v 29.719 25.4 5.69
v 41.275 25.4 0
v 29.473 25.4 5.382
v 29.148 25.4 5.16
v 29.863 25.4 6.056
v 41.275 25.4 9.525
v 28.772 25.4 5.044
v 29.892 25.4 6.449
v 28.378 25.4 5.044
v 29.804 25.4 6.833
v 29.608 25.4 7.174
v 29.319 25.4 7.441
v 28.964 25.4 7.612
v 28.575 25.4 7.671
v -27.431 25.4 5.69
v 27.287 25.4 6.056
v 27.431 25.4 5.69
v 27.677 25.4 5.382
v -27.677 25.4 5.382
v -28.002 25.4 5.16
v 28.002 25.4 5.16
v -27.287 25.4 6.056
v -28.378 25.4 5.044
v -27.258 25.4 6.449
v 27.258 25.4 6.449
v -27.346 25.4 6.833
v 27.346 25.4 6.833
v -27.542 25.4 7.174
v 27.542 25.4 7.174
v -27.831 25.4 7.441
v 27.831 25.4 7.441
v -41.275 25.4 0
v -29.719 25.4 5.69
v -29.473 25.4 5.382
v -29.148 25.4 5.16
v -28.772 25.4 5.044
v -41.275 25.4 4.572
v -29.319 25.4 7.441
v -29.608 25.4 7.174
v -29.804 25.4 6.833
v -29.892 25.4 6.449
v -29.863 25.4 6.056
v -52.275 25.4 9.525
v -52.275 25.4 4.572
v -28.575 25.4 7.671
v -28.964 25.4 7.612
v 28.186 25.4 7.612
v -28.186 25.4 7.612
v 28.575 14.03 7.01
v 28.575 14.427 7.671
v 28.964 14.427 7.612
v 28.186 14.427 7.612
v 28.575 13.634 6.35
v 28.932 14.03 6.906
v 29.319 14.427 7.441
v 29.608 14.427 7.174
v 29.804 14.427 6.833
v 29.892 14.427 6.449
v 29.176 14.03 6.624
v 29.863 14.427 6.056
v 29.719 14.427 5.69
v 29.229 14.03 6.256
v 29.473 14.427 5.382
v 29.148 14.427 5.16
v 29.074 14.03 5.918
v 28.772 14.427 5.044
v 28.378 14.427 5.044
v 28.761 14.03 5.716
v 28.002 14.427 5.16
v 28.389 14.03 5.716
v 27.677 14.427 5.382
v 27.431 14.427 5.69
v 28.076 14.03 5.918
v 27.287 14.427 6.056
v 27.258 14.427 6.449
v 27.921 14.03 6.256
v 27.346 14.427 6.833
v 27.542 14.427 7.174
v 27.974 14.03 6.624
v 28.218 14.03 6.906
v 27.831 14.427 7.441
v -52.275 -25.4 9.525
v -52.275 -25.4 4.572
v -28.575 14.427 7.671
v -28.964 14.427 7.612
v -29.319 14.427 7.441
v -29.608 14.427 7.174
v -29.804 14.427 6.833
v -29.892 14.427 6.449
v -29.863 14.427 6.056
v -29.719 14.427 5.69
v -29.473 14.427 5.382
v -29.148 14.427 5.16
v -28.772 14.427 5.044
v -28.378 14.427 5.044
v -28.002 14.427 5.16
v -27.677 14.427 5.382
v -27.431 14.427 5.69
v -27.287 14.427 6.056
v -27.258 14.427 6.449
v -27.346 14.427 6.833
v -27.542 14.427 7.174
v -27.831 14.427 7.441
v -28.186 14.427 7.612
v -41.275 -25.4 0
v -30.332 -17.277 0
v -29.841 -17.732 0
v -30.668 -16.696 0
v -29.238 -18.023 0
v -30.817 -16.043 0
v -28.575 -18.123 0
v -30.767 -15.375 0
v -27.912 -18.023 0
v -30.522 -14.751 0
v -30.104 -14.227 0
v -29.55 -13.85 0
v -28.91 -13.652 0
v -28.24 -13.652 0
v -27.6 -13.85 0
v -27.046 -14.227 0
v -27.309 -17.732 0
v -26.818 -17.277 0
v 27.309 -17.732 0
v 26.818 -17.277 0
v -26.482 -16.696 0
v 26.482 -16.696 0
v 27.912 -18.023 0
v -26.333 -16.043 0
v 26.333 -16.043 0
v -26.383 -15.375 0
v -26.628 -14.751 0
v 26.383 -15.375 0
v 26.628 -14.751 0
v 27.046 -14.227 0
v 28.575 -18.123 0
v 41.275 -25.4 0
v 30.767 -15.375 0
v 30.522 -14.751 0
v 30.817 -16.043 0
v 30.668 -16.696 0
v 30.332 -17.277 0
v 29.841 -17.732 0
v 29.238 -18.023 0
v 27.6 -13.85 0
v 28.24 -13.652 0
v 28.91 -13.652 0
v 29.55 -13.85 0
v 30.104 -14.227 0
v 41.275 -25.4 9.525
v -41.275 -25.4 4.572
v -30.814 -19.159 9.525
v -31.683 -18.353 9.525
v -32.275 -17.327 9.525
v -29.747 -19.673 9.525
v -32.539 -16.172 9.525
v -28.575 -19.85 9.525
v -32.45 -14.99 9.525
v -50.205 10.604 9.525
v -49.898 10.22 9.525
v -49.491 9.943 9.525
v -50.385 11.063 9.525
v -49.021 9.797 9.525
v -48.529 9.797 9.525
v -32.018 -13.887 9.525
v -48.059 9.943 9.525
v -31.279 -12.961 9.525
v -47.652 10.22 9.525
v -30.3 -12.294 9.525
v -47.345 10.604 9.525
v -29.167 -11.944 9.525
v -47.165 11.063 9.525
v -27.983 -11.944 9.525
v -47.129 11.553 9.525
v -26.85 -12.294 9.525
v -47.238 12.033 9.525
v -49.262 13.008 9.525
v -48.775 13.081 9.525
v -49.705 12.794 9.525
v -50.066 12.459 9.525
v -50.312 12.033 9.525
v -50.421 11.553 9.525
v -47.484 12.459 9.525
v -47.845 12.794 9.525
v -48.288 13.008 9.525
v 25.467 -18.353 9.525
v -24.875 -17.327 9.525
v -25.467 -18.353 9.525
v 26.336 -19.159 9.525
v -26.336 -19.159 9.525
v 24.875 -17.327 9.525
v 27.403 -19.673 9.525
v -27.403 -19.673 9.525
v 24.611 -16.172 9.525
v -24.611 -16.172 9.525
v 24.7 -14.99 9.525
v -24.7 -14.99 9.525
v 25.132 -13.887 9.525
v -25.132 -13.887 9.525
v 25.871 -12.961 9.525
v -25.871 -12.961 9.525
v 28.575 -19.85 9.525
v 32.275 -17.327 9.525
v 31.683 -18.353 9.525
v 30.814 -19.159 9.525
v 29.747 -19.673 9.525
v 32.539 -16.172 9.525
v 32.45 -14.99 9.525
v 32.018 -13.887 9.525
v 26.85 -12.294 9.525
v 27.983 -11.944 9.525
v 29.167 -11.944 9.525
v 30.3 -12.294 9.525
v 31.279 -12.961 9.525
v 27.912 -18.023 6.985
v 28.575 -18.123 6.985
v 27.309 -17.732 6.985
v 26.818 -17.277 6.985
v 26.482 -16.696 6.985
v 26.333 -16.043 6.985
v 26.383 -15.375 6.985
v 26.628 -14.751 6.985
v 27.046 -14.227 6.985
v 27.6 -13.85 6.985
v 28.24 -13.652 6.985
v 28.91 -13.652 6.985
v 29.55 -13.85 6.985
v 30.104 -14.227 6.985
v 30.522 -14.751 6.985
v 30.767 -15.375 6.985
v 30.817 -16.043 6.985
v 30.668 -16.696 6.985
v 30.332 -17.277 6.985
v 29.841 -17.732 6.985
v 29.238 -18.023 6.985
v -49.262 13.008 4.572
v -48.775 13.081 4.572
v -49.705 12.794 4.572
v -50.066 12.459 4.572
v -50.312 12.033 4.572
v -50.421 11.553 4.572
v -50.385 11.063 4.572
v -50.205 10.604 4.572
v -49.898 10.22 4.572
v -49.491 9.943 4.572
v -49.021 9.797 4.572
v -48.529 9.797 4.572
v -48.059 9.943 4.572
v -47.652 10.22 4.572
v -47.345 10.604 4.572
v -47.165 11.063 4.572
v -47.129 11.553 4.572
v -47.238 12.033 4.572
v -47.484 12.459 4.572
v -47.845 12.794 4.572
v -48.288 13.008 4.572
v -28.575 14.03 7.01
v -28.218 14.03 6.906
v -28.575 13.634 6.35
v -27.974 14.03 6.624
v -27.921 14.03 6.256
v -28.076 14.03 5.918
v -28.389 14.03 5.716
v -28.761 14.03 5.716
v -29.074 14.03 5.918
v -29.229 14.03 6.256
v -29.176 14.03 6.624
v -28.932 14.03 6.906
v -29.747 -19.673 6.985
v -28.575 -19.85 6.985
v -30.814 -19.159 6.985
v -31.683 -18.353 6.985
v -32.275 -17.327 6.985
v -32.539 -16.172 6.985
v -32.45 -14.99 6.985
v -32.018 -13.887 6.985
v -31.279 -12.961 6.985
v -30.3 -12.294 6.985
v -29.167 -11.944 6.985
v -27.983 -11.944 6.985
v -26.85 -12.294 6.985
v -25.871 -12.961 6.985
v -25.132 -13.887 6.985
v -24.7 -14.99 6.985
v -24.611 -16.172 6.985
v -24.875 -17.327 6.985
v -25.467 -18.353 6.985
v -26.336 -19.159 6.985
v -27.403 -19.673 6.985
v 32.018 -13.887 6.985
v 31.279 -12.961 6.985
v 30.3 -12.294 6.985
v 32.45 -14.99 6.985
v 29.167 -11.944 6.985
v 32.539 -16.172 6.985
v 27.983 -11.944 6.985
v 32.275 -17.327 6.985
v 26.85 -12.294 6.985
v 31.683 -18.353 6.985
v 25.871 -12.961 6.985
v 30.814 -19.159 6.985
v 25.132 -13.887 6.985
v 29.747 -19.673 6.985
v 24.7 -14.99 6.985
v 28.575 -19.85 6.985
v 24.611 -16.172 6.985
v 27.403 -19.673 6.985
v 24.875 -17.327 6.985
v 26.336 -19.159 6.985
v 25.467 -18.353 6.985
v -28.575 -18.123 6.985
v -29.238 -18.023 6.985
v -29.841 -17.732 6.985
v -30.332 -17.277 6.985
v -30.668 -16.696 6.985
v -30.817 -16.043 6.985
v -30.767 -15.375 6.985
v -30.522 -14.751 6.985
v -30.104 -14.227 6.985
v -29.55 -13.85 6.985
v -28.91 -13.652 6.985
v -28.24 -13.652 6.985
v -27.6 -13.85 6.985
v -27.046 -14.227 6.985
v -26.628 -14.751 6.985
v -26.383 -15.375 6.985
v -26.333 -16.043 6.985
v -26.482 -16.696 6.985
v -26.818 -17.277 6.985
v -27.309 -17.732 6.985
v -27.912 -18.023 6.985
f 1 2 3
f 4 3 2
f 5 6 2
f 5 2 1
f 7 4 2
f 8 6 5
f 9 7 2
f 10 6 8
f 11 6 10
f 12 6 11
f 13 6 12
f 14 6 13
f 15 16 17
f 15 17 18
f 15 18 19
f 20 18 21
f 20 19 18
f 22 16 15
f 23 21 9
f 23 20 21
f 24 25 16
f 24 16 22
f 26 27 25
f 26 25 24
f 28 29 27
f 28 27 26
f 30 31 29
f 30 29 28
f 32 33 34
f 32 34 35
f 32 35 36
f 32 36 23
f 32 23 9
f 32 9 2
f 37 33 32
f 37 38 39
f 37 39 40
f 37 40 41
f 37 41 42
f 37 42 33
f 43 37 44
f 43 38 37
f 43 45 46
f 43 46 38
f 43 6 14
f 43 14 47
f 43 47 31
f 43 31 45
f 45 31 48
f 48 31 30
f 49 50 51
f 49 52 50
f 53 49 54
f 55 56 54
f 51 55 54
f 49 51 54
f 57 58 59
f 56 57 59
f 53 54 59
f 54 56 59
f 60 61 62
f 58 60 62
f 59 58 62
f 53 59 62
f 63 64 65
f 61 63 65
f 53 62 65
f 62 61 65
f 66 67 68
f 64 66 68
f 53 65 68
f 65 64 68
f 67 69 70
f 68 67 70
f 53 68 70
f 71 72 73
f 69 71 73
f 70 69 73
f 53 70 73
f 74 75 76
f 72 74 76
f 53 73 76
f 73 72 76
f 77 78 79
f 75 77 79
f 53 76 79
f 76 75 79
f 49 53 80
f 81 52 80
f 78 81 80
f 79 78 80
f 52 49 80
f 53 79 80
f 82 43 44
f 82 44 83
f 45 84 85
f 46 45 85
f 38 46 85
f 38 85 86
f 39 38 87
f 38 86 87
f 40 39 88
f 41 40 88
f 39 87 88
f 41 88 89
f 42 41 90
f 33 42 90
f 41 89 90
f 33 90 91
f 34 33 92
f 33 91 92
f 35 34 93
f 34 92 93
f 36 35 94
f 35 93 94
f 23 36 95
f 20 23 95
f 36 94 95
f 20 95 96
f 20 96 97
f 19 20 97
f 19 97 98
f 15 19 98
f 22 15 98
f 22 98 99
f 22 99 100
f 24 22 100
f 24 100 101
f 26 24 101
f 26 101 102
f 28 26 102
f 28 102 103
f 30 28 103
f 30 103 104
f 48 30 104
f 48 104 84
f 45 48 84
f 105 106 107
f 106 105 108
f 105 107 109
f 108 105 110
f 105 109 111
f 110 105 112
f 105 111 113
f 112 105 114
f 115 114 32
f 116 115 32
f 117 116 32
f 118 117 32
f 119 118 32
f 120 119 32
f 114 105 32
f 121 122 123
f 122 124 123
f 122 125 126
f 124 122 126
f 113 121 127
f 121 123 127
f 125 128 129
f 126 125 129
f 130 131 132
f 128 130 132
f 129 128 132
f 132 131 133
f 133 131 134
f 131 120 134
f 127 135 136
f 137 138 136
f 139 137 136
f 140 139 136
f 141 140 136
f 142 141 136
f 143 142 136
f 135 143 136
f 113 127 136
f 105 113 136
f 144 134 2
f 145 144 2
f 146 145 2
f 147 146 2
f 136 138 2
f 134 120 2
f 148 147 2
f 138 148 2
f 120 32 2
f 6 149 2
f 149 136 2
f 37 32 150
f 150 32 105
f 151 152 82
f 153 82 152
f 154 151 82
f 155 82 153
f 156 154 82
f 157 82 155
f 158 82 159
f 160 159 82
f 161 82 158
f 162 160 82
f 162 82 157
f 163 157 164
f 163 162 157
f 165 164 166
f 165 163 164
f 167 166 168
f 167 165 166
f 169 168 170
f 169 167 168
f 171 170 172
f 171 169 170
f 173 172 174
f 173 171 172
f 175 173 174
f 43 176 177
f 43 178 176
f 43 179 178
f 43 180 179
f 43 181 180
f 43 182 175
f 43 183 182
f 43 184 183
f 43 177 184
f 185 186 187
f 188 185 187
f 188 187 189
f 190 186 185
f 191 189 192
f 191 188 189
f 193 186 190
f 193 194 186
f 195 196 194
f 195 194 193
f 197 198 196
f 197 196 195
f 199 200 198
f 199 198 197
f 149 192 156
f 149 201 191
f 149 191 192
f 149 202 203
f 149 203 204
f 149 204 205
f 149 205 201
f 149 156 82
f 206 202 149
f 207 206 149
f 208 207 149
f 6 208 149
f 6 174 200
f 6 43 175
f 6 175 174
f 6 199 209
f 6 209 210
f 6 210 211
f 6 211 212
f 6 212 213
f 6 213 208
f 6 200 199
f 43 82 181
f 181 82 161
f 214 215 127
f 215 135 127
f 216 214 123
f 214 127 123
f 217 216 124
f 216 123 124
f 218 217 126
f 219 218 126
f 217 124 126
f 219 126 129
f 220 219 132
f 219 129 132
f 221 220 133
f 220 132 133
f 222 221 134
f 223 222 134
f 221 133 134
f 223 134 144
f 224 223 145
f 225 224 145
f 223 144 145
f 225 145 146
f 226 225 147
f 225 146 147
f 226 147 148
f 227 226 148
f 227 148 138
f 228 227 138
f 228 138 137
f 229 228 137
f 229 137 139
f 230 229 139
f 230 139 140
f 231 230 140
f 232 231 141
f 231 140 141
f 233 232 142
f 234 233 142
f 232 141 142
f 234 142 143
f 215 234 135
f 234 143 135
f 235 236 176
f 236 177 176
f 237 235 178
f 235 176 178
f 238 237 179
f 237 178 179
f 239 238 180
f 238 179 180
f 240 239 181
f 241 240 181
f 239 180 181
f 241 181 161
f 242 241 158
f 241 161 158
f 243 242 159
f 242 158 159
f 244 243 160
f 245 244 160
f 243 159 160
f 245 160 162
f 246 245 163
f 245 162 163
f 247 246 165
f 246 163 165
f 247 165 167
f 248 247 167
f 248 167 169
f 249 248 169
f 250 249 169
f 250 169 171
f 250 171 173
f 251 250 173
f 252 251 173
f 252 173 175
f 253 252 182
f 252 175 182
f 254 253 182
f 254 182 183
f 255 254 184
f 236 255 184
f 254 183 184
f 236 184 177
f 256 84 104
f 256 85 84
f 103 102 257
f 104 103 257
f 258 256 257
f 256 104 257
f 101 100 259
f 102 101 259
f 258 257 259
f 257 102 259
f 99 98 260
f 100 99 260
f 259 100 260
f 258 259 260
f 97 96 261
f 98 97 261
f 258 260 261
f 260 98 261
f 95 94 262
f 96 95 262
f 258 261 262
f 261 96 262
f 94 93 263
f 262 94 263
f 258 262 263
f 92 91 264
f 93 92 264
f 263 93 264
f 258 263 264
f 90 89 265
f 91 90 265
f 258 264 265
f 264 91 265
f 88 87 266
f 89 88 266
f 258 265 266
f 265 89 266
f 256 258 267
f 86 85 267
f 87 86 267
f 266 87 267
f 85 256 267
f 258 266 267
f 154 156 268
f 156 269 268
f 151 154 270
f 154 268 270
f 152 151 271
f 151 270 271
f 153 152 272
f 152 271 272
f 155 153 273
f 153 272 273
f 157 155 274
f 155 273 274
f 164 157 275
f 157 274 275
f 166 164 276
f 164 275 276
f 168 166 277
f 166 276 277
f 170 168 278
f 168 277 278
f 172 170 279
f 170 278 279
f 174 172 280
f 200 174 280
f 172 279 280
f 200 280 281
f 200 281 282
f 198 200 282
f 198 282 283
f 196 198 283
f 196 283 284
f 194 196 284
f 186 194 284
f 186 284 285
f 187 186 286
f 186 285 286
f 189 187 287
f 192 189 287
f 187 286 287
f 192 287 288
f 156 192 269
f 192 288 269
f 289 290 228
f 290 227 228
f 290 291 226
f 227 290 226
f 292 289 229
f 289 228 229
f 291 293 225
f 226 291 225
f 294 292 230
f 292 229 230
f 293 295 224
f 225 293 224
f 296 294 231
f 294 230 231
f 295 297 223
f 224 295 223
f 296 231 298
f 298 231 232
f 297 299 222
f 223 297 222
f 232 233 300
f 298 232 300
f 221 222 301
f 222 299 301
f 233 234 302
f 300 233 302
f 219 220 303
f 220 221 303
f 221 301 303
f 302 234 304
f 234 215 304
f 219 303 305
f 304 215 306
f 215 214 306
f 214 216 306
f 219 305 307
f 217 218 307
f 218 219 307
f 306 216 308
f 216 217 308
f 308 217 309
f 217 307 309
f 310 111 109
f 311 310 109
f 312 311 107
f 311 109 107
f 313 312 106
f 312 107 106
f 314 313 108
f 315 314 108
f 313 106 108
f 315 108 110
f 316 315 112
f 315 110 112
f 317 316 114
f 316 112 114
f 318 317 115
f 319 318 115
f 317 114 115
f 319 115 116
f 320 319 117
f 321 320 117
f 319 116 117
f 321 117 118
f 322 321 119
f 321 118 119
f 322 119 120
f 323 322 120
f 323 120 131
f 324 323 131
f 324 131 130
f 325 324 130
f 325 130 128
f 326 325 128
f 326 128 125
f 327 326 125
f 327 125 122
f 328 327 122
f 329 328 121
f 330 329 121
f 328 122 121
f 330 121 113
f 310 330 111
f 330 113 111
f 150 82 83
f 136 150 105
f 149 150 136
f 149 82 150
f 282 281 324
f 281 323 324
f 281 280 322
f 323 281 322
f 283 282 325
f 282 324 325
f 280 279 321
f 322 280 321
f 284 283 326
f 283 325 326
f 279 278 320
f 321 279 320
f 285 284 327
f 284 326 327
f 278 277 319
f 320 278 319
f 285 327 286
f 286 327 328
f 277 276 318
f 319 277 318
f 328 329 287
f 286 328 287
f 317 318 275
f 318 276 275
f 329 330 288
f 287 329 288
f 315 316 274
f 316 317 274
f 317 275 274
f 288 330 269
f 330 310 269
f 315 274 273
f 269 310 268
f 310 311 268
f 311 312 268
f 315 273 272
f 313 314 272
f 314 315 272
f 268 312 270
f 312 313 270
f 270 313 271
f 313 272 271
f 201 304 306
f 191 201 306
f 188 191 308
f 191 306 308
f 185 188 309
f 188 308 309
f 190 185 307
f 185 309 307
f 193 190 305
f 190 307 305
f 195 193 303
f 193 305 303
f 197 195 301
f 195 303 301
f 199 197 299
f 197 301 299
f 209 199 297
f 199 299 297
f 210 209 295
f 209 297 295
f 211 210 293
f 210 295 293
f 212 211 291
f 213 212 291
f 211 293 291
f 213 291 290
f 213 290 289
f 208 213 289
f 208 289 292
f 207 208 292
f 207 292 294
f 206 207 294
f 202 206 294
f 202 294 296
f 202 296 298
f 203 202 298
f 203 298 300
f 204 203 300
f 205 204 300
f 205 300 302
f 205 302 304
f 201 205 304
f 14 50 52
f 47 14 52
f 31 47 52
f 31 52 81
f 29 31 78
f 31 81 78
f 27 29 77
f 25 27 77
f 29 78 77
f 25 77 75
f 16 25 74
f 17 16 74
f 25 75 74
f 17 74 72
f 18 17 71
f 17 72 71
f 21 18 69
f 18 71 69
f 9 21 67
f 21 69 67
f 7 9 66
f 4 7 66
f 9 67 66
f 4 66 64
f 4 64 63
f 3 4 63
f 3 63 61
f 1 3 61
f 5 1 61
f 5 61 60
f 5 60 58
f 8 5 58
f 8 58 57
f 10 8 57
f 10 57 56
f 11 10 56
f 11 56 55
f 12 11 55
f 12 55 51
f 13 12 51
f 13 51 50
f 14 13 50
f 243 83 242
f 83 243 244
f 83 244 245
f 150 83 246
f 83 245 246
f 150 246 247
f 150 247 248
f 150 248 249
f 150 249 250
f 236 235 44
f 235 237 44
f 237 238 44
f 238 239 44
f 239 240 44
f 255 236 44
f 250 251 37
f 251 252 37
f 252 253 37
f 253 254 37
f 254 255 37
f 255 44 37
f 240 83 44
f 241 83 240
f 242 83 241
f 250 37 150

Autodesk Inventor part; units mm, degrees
ref_plane "YZ Plane" through (0, 0, 0) normal (1, 0, 0) x (0, 1, 0)
ref_plane "XZ Plane" through (0, 0, 0) normal (0, 1, 0) x (-1, 0, 0)
ref_plane "XY Plane" through (0, 0, 0) normal (0, 0, 1) x (1, 0, 0)
sketch "Sketch1" plane through (0, 0, 0) normal (0, 0, 1) x (1, 0, 0)
  line L0 (-41.275, -25.4) -> (41.275, -25.4)
  line L1 (41.275, -25.4) -> (41.275, 25.4)
  line L2 (41.275, 25.4) -> (-41.275, 25.4)
  line L3 (-41.275, 25.4) -> (-41.275, -25.4)
  line L4 (-41.275, -25.4) -> (41.275, 25.4) construction
  line L5 (41.275, -25.4) -> (-41.275, 25.4) construction
  point P0 (0, 0)
  dimension "d0" = 82.55
  dimension "d1" = 50.8
extrude "Extrusion1" add sketch "Sketch1" along normal blind 9.525
sketch "Sketch2" plane through (0, 0, 9.525) normal (0, 0, 1) x (1, 0, 0)
  line L0 (-28.575, -15.875) -> (28.575, -15.875)
  line L1 (-41.275, 25.4) -> (-41.275, -25.4) projected
  line L2 (-41.275, -25.4) -> (41.275, -25.4) projected
  point P0 (0, 0)
  dimension "d4" = 57.15
  dimension "d5" = 12.7
  dimension "d6" = 9.525
hole "Hole1" at (-28.575, -15.875, 9.525) at (28.575, -15.875, 9.525) direction (0, 0, -1) diameter 4.4958 depth 25.4 tip angle 118 counterbore diameter 7.9502 counterbore depth 2.54 clearance for "Socket Head Cap Screw" size "#8" standard "Ansi Unified Screw Threads"
sketch "Sketch3" plane through (0, 0, 9.525) normal (0, 0, 1) x (1, 0, 0)
  line L0 (-41.275, 25.4) -> (-41.275, -25.4) projected
  line L1 (-41.275, -25.4) -> (-41.275, 25.4)
  line L2 (-41.275, 25.4) -> (-52.275, 25.4)
  line L3 (-52.275, 25.4) -> (-52.275, -25.4)
  line L4 (-52.275, -25.4) -> (-41.275, -25.4)
  point P0 (0, 0)
  dimension "d14" = 11
extrude "Extrusion2" add sketch "Sketch3" against normal blind 4.953
sketch "Sketch4" plane through (0, 0, 4.572) normal (0, 0, -1) x (-1, 0, 0)
  line L0 (52.275, 25.4) -> (41.275, 25.4) projected
  line L1 (52.275, -25.4) -> (52.275, 25.4) projected
  point P0 (0, 0)
  point P1 (48.775, 11.43)
  dimension "d17" = 13.97
  dimension "d18" = 3.5
hole "Hole2" at (-48.775, 11.43, 4.572) direction (0, 0, 1) diameter 3.302 depth 12.2936 tip angle 118 thread size "8-32 UNC" class "2B" standard "ANSI Unified Screw Threads"
sketch "Sketch5" plane through (-41.275, 25.4, 0) normal (0, 1, 0) x (1, 0, 0)
  line L0 (69.85, -6.35) -> (12.7, -6.35)
  line L1 (0, 0) -> (0, -4.572) projected
  line L2 (82.55, -9.525) -> (-11, -9.525) projected
  point P0 (41.275, 0)
  dimension "d26" = 57.15
  dimension "d27" = 12.7
  dimension "d28" = 3.175
hole "Hole3" at (-28.575, 25.4, 6.35) at (28.575, 25.4, 6.35) direction (0, -1, 0) diameter 2.6416 depth 10.9728 tip angle 118 thread size "6-32 UNC" class "2B" standard "ANSI Unified Screw Threads"
properties part number "right side"
